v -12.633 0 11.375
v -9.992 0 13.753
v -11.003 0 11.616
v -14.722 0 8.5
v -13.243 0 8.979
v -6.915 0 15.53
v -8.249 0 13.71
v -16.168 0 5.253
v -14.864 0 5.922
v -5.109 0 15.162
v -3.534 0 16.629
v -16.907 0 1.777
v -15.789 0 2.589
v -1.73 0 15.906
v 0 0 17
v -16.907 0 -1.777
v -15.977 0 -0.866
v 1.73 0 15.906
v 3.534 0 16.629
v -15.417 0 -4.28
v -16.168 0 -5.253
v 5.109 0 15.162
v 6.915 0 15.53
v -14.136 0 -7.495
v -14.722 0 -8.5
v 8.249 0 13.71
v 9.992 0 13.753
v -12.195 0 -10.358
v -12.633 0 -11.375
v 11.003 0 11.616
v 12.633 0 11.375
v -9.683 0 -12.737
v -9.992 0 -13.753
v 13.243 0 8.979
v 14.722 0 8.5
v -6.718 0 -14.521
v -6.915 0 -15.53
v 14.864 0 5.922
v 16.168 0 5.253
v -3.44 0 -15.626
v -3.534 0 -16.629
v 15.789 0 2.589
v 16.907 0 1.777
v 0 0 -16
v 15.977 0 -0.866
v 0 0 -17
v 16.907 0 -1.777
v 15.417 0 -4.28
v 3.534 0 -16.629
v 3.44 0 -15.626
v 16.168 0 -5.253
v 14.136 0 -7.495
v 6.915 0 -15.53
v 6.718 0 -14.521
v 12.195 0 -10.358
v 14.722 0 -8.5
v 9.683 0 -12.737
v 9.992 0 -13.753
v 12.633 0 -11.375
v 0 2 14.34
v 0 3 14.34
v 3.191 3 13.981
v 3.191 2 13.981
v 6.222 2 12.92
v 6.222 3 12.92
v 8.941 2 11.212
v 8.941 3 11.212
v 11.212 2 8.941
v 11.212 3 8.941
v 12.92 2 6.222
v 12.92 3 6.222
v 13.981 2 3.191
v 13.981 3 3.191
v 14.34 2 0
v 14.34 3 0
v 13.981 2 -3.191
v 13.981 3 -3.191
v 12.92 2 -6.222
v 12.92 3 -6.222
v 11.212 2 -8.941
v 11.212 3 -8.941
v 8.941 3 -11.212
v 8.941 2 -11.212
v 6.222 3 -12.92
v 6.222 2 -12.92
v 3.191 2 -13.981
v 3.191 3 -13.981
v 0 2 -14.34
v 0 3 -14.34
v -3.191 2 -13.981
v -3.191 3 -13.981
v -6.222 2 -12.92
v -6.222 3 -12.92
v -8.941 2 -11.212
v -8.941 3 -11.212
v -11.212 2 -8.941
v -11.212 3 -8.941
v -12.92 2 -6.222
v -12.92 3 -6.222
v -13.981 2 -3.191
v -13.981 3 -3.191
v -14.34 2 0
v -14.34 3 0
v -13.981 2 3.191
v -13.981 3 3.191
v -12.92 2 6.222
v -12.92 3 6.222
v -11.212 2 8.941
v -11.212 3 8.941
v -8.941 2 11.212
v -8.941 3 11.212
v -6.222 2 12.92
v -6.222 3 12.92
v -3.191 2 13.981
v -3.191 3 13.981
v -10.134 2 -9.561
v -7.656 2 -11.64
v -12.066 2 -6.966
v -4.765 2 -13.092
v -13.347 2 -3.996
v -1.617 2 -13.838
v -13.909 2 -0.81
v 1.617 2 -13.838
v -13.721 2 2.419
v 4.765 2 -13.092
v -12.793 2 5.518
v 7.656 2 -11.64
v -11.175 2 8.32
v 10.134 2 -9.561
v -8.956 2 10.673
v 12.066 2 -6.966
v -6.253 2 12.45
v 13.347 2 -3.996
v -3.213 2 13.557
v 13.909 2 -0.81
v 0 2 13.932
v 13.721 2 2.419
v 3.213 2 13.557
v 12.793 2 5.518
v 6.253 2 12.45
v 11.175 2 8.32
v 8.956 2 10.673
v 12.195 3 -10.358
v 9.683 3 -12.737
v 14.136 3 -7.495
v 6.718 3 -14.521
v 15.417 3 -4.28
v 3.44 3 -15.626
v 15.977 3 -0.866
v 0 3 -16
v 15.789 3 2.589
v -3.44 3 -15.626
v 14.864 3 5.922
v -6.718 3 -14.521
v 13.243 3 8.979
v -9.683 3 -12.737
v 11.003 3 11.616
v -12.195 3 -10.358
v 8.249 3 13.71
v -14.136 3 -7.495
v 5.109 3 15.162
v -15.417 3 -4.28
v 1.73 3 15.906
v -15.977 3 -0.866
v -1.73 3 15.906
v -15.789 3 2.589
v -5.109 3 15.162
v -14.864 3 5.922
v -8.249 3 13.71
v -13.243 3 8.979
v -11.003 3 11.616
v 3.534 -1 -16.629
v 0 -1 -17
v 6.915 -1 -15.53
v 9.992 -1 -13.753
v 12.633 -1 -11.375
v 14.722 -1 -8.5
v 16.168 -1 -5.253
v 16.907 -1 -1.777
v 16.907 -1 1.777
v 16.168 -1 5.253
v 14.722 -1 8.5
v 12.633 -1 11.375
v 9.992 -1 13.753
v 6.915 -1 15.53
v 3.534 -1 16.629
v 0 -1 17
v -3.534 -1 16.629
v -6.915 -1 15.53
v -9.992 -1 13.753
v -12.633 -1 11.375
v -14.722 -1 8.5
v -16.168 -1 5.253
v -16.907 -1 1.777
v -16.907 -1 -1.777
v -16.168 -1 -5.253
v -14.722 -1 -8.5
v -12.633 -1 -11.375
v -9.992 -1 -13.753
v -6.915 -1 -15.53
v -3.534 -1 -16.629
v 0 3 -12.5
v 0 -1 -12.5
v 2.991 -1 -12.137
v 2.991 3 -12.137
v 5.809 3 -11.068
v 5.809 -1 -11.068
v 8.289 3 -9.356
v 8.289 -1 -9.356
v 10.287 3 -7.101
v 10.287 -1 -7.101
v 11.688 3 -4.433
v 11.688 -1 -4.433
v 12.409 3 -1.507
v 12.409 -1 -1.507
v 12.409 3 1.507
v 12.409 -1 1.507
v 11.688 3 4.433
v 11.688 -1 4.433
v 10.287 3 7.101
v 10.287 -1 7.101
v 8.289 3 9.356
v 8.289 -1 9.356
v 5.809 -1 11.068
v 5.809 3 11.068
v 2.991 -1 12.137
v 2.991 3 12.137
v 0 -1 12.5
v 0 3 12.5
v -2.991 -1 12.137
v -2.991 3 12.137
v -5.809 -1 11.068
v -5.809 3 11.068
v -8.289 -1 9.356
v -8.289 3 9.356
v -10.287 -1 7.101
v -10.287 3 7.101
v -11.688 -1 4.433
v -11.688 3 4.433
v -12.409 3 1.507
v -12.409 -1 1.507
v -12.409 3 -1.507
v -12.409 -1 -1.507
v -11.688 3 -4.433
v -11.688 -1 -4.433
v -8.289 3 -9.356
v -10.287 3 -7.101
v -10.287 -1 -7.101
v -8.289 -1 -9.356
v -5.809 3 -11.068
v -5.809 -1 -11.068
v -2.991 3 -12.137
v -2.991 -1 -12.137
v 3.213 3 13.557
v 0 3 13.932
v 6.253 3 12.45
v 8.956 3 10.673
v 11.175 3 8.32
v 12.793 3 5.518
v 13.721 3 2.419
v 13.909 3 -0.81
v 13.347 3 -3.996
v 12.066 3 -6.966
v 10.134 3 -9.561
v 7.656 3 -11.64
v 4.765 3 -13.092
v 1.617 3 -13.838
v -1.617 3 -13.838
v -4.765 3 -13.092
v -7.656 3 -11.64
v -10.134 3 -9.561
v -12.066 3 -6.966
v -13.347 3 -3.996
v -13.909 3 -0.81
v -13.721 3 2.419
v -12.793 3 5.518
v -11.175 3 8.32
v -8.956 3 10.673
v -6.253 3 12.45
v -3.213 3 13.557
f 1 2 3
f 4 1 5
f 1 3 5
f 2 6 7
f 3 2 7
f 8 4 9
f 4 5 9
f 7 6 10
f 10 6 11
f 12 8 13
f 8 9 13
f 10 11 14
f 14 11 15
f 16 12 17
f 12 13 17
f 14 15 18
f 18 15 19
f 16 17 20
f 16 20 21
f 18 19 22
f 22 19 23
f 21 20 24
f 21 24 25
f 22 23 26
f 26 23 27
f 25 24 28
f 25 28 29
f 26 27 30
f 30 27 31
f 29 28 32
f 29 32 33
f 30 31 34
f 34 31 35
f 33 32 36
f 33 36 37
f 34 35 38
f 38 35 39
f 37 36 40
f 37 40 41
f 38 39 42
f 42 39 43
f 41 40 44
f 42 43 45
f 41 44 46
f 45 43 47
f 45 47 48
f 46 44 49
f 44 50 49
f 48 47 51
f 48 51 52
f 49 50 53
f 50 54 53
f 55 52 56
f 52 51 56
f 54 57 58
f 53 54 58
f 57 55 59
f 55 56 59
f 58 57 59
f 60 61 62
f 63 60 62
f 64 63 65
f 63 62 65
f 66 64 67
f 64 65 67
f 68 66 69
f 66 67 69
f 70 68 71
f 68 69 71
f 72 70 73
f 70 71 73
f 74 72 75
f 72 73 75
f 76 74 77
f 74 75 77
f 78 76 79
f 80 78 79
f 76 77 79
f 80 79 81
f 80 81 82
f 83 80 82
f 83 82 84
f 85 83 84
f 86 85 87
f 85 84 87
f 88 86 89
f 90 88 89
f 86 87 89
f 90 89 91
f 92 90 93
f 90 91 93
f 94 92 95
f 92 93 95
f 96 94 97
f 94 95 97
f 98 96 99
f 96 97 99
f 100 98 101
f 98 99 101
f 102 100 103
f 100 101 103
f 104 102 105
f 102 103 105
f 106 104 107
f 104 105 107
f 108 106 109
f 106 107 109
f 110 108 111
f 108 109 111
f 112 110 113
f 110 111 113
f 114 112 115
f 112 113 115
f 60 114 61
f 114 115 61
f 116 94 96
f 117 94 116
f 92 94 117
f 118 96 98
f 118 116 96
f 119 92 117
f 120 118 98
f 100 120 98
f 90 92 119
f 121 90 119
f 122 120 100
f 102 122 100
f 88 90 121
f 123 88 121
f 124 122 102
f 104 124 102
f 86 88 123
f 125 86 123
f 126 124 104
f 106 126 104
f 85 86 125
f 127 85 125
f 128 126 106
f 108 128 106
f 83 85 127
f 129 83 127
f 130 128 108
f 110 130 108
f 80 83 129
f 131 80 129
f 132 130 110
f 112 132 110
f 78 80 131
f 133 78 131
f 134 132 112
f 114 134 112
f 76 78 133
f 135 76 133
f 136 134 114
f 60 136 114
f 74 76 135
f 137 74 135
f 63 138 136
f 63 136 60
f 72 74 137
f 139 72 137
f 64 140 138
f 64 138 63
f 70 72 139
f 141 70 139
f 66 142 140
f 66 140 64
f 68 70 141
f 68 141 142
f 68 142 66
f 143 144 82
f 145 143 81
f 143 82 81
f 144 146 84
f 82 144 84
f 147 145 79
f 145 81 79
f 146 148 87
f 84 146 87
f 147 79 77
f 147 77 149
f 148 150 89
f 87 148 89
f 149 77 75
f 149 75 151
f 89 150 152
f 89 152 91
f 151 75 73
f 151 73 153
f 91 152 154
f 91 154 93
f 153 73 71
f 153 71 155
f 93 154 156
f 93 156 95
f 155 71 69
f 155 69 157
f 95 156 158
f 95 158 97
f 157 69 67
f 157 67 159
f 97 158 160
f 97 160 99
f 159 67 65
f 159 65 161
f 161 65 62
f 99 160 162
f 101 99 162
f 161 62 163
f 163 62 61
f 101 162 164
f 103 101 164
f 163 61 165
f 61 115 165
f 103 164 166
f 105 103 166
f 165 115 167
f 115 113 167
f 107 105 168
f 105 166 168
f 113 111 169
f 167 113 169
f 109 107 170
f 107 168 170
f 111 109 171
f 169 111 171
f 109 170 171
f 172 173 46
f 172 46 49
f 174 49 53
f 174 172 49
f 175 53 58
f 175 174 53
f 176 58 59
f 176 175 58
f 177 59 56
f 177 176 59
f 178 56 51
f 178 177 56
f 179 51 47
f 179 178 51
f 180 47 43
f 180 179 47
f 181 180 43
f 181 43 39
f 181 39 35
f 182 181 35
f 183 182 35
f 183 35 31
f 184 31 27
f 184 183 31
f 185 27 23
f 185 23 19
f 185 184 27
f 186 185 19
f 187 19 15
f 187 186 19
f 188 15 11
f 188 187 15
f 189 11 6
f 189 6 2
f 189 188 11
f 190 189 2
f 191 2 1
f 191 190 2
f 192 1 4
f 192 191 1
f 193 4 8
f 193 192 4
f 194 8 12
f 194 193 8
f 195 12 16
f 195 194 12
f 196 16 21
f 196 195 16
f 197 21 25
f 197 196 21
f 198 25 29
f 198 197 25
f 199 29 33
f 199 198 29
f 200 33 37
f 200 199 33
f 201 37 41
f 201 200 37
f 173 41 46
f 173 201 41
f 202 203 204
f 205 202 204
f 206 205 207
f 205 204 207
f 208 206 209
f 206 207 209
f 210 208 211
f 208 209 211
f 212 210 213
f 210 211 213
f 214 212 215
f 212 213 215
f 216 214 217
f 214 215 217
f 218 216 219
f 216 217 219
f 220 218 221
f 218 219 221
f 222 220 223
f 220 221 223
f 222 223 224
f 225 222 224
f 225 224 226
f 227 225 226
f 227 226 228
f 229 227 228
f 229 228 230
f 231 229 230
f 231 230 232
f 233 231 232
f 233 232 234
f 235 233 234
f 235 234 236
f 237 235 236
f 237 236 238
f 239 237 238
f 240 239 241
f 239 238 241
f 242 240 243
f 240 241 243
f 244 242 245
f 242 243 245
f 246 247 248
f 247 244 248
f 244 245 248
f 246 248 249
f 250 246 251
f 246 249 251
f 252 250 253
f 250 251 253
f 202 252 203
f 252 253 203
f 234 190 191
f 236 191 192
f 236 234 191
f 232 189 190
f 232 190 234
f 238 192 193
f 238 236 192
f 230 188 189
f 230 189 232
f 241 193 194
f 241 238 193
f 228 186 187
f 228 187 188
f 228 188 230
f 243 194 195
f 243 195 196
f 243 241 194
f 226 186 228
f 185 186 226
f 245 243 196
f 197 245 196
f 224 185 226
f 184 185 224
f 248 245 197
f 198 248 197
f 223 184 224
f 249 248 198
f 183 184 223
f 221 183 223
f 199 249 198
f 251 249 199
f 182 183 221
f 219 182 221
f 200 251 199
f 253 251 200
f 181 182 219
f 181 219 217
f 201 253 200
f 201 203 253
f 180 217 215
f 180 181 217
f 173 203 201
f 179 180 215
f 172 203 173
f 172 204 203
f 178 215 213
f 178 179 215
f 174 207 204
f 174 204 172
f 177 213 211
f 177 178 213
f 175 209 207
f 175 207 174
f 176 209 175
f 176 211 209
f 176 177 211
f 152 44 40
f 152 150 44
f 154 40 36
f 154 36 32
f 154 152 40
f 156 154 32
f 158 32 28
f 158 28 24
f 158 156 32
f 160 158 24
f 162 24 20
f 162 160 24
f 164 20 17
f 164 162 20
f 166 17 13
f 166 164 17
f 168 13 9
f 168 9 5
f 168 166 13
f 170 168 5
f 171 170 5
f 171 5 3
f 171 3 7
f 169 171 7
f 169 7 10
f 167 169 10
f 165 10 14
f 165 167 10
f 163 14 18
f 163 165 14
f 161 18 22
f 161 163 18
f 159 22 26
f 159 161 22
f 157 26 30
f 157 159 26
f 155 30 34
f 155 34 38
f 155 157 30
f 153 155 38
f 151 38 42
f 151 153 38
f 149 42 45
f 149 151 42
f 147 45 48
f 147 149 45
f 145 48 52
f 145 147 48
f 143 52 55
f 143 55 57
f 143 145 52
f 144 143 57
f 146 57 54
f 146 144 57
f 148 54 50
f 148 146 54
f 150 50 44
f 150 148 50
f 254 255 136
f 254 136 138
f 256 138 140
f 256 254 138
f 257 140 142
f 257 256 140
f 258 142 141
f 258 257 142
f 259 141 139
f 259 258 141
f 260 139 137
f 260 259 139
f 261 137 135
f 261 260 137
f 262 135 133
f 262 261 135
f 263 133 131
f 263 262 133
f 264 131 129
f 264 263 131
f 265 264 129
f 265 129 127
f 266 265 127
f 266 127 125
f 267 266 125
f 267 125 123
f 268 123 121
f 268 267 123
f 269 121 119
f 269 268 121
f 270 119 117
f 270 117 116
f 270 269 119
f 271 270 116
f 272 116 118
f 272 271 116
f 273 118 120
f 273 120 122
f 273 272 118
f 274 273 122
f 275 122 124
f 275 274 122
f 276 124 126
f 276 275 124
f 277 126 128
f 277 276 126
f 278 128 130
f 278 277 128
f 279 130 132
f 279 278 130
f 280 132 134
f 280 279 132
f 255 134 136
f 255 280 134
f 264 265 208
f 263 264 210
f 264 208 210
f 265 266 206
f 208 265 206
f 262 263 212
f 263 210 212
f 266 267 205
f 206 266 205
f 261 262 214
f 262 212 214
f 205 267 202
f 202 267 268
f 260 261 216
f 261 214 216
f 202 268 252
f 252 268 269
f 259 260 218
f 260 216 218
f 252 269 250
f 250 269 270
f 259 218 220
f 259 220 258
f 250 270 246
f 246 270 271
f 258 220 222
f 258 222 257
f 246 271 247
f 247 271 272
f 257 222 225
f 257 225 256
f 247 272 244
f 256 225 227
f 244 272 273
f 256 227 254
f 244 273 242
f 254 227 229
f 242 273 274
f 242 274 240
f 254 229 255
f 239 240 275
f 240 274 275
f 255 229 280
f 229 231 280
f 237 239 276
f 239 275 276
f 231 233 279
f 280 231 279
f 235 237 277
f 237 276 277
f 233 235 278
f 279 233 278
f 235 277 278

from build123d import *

# Parameters (mm, degrees)
SKETCH_1_W          = 3.5
SKETCH_1_H          = 3
EXTRUDE_START       = 1
SKETCH_2_R          = 17
SKETCH_2_R_2        = 12.5
EXTRUDE_1_DEPTH     = 1
SKETCH_3_R          = 14.340356903
SKETCH_3_R_2        = 13.93231215
CUT_EXTRUDE_1_DEPTH = 1


with BuildPart() as part:
    # 草图1 → 旋转1 (revolve)
    with BuildSketch(Plane.XY, mode=Mode.PRIVATE) as revolve_1_sk:
        with Locations((14.25, 1.5)):
            Rectangle(SKETCH_1_W, SKETCH_1_H)
    revolve(revolve_1_sk.sketch.rotate(Axis((0, 0, 0), (0, 1, 0)), 90), axis=Axis((0, 0, 0), (0, 1, 0)))

    # 草图2 → 凸台-拉伸1 (add)
    with BuildSketch(Plane.XZ.offset(EXTRUDE_START)):
        with Locations(Location((0, 0, 0), (0, 0, 270))):
            Circle(SKETCH_2_R)
        with Locations(Location((0, 0, 0), (0, 0, 270))):
            Circle(SKETCH_2_R_2, mode=Mode.SUBTRACT)
    extrude(amount=-EXTRUDE_1_DEPTH)

    # 草图3 → 切除-拉伸1 (cut)
    with BuildSketch(Plane(origin=(0, 3, 0), x_dir=(1, 0, 0), z_dir=(0, 1, 0))):
        with Locations(Location((0, 0, 0), (0, 0, 270))):
            Circle(SKETCH_3_R)
        with Locations(Location((0, 0, 0), (0, 0, 270))):
            Circle(SKETCH_3_R_2, mode=Mode.SUBTRACT)
    extrude(amount=-CUT_EXTRUDE_1_DEPTH, mode=Mode.SUBTRACT)


solid = part.part
